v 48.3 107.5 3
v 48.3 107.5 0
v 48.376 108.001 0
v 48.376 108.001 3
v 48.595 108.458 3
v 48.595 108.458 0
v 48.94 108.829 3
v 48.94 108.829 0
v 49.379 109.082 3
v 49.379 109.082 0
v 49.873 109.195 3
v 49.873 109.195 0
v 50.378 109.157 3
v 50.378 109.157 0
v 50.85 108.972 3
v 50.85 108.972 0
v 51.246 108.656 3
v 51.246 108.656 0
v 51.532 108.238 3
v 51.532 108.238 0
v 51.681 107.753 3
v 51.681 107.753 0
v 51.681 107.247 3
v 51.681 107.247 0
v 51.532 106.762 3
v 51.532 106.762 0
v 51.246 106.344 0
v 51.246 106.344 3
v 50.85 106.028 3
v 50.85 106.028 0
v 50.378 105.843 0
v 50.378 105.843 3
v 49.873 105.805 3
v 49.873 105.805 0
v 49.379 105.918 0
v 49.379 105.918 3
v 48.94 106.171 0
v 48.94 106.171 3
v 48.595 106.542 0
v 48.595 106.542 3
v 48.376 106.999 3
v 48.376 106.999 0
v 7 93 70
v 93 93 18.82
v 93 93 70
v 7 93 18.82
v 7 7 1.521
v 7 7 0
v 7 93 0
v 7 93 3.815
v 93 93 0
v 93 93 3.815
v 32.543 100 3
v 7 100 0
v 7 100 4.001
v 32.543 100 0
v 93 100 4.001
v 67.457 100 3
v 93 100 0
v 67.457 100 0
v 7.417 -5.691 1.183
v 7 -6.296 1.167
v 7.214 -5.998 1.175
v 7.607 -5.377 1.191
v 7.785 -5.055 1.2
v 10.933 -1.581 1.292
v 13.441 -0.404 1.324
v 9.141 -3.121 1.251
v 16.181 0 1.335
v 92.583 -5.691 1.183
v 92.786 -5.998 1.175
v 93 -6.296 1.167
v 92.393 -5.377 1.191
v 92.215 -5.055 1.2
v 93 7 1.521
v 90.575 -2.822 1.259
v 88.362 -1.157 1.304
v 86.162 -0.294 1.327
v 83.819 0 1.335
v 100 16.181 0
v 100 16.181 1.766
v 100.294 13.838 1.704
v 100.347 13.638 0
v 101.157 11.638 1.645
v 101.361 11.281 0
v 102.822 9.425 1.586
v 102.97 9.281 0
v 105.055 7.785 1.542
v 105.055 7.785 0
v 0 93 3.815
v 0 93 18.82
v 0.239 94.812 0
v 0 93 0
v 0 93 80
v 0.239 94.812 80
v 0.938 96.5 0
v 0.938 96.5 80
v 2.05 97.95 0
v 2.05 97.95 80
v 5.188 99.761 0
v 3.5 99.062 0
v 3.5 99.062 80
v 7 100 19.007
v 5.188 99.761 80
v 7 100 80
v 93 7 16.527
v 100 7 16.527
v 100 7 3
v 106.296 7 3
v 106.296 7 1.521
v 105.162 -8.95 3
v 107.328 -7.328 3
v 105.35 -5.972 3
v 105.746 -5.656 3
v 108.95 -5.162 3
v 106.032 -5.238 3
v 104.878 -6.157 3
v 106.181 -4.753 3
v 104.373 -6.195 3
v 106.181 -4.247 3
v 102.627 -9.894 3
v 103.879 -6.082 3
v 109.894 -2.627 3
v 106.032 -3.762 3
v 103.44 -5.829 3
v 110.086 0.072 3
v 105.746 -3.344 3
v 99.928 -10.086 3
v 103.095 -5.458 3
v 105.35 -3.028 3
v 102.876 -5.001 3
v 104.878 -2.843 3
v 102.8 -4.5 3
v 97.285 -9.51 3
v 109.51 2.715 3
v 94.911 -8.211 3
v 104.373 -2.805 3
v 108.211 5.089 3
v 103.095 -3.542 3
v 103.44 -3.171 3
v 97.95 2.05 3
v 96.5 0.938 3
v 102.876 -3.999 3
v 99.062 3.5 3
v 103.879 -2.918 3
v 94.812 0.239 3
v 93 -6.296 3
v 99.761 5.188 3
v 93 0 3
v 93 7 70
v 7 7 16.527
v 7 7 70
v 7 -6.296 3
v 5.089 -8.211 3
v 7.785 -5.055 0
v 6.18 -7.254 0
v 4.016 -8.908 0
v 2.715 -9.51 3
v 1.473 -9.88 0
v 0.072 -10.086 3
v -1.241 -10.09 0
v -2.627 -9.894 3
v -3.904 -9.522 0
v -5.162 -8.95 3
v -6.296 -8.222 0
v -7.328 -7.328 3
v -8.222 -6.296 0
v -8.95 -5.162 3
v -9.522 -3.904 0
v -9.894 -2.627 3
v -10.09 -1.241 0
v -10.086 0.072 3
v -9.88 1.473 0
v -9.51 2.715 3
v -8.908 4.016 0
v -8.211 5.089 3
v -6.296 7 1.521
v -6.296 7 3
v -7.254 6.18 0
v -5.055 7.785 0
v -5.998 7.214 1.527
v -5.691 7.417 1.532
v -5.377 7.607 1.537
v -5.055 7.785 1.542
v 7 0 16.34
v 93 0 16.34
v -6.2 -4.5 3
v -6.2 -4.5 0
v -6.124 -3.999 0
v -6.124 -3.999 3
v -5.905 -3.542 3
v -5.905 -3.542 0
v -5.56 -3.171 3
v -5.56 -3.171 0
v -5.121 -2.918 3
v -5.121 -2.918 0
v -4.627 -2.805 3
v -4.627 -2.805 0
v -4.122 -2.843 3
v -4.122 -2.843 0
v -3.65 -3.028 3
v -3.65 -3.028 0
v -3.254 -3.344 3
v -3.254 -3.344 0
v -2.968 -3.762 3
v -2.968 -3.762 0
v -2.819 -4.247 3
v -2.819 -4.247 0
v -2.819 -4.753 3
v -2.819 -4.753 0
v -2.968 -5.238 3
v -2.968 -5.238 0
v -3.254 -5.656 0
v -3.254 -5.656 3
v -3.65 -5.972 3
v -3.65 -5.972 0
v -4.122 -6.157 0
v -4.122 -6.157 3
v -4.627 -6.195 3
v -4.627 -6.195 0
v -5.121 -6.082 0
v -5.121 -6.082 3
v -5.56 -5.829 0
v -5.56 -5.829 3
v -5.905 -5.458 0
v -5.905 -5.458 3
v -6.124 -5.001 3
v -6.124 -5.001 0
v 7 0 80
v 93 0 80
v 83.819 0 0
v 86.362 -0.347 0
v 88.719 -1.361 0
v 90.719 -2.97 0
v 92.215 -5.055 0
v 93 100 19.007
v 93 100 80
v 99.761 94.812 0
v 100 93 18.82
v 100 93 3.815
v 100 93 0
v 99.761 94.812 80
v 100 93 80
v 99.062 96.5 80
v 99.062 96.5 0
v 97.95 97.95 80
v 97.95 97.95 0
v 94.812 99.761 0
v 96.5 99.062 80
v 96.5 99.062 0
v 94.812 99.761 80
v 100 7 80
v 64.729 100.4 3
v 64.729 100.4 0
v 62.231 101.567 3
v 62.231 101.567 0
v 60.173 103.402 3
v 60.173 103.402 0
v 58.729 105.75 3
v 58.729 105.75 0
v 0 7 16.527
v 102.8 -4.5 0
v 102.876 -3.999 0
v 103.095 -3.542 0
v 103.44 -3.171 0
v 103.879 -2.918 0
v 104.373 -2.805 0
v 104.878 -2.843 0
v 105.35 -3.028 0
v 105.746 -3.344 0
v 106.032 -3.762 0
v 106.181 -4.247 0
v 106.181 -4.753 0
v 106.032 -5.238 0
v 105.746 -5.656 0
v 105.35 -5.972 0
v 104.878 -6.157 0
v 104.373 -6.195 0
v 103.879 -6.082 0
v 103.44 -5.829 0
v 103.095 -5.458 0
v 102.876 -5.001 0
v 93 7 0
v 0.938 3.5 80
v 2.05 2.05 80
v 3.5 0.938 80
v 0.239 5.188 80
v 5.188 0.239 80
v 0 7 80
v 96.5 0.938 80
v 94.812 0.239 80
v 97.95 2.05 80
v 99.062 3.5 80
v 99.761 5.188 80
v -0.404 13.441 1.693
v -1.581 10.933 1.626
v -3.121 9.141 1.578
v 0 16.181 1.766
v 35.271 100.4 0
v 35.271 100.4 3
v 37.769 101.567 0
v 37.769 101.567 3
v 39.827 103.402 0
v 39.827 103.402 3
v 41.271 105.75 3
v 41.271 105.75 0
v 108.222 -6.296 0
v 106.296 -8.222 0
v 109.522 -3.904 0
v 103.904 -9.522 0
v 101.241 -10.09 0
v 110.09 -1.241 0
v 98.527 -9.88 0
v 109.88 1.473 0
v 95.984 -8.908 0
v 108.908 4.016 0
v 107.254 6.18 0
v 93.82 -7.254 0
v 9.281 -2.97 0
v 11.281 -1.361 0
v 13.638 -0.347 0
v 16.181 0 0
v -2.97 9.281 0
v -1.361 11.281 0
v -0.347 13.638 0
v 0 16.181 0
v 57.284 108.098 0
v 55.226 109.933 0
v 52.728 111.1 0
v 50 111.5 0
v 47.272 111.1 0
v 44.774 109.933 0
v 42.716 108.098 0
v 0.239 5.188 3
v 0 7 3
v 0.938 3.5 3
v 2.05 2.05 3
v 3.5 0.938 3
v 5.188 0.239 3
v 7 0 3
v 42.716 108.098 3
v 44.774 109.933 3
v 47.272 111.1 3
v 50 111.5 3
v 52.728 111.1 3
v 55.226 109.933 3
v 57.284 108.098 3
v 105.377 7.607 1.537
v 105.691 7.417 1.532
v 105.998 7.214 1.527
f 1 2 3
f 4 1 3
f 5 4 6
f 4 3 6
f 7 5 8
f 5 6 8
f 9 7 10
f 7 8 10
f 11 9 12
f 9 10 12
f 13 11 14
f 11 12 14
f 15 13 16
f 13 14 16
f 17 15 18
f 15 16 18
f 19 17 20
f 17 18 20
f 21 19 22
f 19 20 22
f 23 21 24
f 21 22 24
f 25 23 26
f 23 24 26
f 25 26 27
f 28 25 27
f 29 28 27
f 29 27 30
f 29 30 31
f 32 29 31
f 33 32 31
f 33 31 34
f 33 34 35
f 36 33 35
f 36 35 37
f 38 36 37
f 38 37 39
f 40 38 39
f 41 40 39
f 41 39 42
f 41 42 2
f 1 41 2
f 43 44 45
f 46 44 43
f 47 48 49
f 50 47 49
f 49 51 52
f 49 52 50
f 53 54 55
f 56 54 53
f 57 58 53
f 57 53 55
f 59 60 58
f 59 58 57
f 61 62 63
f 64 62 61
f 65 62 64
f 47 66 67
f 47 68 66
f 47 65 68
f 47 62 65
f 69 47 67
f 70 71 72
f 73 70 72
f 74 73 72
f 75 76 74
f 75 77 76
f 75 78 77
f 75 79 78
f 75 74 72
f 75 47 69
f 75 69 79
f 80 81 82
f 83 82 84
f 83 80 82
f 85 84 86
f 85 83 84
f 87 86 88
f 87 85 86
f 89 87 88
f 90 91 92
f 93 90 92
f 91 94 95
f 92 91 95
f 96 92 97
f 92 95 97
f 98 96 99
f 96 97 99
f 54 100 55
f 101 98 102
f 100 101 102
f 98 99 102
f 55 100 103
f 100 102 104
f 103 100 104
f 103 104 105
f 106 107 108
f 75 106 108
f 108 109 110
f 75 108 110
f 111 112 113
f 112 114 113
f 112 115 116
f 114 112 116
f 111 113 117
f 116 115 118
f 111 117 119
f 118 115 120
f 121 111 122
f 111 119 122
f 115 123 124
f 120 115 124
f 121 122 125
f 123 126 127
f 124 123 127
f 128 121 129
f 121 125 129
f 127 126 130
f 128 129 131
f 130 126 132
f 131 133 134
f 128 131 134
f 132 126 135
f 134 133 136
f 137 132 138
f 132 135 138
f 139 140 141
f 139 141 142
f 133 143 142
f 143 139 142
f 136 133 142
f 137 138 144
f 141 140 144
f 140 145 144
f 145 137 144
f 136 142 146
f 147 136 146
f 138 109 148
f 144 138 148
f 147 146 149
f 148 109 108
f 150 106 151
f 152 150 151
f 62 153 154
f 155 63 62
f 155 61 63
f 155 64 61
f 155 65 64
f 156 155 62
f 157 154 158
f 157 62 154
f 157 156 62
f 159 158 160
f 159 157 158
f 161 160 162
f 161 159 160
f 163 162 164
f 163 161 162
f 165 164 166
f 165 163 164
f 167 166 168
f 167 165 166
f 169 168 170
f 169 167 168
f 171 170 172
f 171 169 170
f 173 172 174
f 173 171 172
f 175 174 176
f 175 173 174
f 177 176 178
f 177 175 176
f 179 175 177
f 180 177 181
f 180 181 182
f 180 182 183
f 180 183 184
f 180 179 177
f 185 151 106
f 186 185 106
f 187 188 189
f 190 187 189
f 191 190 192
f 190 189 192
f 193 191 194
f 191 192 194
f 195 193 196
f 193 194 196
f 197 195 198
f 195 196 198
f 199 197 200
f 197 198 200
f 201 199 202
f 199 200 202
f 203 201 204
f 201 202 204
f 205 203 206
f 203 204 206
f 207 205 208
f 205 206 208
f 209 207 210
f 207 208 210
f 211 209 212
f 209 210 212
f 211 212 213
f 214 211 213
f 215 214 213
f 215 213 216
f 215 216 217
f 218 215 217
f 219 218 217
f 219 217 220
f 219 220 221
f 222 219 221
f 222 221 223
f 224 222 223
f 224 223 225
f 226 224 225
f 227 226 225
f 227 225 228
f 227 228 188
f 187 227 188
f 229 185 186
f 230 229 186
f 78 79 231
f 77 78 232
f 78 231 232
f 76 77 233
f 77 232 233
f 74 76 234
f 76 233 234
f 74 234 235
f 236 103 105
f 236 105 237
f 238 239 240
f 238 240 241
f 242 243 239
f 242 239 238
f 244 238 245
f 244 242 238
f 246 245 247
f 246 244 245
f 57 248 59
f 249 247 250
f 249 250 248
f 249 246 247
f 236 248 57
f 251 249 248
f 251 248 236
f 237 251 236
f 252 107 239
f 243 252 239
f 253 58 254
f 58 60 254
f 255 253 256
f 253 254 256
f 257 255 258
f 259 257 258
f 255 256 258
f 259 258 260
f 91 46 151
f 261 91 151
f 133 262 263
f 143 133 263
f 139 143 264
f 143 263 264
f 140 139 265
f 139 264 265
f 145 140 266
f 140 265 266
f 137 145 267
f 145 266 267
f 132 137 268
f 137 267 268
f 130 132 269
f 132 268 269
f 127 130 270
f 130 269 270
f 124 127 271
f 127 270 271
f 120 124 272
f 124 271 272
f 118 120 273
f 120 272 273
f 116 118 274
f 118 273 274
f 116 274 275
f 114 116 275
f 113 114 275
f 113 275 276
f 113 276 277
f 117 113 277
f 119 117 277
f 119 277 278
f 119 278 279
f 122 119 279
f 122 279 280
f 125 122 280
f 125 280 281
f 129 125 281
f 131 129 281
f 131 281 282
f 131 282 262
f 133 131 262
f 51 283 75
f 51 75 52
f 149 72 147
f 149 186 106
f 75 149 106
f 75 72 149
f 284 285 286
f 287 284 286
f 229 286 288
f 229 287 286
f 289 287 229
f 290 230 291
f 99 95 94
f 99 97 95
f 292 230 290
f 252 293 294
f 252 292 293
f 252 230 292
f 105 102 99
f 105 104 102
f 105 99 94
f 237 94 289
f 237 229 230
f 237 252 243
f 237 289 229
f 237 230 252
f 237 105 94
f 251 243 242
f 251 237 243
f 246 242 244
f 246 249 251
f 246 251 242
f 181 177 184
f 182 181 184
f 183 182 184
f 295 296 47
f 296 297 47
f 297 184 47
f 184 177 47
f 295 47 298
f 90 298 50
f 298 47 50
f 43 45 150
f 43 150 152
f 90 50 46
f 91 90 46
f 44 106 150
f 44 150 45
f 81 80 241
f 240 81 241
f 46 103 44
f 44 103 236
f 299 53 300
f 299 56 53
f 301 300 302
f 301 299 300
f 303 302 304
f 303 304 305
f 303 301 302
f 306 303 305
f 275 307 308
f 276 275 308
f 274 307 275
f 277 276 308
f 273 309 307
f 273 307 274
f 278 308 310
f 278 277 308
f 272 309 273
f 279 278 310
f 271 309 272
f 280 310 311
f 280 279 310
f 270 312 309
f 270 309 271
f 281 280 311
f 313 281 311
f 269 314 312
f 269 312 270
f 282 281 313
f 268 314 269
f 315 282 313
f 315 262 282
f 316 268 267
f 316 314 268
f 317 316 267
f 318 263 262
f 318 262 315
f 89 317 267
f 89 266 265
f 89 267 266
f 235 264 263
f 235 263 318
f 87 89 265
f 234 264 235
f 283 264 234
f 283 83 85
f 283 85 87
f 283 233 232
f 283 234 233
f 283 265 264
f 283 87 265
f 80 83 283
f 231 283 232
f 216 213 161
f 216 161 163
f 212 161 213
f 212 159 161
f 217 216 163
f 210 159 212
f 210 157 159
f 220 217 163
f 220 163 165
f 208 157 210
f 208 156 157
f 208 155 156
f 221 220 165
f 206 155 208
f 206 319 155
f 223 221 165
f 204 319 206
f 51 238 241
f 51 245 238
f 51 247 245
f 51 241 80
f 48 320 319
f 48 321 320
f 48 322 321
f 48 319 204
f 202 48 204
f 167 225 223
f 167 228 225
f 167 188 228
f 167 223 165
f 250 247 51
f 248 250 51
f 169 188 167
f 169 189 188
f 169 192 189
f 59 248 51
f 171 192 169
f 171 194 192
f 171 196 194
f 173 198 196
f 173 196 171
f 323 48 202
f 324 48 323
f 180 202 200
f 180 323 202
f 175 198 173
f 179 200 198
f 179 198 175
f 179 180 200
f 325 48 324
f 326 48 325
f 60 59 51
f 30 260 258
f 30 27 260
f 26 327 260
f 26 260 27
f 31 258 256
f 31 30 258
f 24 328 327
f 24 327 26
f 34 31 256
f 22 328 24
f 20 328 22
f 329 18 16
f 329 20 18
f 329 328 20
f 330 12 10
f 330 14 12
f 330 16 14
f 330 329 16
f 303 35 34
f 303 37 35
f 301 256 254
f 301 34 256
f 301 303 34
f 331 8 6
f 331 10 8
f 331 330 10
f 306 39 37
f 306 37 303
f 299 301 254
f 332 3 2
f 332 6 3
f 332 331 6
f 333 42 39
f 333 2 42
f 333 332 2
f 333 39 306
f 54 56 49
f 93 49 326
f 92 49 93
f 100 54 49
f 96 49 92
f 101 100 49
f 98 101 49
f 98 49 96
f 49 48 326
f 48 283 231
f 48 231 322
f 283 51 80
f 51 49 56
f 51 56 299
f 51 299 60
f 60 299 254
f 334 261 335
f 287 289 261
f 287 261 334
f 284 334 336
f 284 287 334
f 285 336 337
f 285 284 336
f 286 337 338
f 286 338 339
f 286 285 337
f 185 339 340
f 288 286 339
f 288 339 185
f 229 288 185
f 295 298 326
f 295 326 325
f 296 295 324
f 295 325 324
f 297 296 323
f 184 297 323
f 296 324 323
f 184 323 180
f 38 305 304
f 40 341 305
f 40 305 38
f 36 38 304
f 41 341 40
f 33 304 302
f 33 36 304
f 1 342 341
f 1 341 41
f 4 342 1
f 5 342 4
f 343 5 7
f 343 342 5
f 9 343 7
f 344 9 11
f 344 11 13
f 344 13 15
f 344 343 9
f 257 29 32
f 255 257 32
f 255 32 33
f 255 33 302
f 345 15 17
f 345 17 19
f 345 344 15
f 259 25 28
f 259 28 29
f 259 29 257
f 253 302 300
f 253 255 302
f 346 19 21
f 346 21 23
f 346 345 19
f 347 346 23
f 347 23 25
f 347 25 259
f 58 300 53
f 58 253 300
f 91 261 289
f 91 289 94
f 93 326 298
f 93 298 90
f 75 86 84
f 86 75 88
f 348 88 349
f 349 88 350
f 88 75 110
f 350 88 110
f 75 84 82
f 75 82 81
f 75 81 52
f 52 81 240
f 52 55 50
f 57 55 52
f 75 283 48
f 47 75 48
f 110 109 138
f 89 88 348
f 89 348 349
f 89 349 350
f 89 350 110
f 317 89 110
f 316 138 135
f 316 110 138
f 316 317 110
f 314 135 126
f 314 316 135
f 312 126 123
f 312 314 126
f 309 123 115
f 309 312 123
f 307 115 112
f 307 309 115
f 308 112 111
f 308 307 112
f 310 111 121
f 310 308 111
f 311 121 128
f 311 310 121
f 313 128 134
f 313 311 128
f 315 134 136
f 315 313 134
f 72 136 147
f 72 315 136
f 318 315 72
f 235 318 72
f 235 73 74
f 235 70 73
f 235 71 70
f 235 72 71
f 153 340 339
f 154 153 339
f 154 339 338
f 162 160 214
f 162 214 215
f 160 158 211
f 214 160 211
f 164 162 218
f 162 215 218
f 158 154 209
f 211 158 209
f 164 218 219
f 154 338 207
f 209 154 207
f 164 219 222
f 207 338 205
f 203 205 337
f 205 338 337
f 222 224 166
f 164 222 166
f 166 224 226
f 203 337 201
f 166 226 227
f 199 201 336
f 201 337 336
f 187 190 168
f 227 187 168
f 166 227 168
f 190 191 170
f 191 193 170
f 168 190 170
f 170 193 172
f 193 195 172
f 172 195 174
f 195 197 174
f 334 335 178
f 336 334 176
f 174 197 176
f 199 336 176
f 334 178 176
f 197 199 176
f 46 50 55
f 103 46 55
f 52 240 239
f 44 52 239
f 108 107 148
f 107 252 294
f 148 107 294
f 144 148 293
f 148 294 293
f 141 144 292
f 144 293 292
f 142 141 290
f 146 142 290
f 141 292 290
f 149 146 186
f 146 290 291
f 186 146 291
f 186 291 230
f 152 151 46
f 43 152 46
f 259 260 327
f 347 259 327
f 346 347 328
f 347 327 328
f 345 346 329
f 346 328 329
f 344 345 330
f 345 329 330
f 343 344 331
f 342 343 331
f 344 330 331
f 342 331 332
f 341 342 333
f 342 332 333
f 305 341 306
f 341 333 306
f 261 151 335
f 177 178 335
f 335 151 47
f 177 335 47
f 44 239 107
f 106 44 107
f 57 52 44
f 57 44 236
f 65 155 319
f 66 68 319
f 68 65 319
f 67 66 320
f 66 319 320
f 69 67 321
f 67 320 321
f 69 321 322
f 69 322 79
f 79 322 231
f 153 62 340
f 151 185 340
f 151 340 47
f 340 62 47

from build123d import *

# Parameters (mm, degrees)
ESQUISSE1_W                           = 100
ESQUISSE1_H                           = 100
BOSS_EXTRU_1_DEPTH                    = 80
ESQUISSE2_W                           = 86
ESQUISSE2_H                           = 86
ENL_V_MAT_EXTRU_1_DEPTH               = 70
ESQUISSE4_R                           = 9.5
ESQUISSE4_R_2                         = 1.5
BOSS_EXTRU_3_DEPTH                    = 3
CONG_1_R                              = 7
CONG_4_R                              = 9.5
D_GAGEMENT_M31_D                      = 3.4
D_GAGEMENT_M31_DEPTH                  = 3
ENL_V_MAT_EXTRU_2_REACH               = 184.154
ENL_V_MAT_EXTRU_2_OFFSET_FROM_SURFACE = 7
ESQUISSE8_W                           = 86
ESQUISSE8_H                           = 15
ENL_V_START                           = -13.296333
ENL_V_MAT_EXTRU_3_DEPTH               = 112.592666


with BuildPart() as part:
    # Esquisse1 → Boss.-Extru.1 (new body)
    with BuildSketch(Plane.XY):
        with Locations((50, 50)):
            Rectangle(ESQUISSE1_W, ESQUISSE1_H)
    extrude(amount=BOSS_EXTRU_1_DEPTH)

    # Esquisse2 → Enlèv. mat.-Extru.1 (cut)
    with BuildSketch(Plane(origin=(0, 0, 0), x_dir=(-1, 0, 0), z_dir=(0, 0, -1))):
        with Locations((-50, 50)):
            Rectangle(ESQUISSE2_W, ESQUISSE2_H)
    extrude(amount=-ENL_V_MAT_EXTRU_1_DEPTH, mode=Mode.SUBTRACT)

    # Esquisse4 → Boss.-Extru.3 (add)
    # profile 1 of 3: a face of its own
    with BuildSketch(Plane(origin=(0, 0, 0), x_dir=(-1, 0, 0), z_dir=(0, 0, -1))):
        with Locations((0.610912703, -0.610912703)):
            Circle(ESQUISSE4_R)
        with Locations((4.5, -4.5)):
            Circle(ESQUISSE4_R_2, mode=Mode.SUBTRACT)
    # profile 2 of 3: a face of its own
    with BuildSketch(Plane(origin=(0, 0, 0), x_dir=(-1, 0, 0), z_dir=(0, 0, -1))):
        with Locations((-100.610912703, -0.610912703)):
            Circle(ESQUISSE4_R)
        with Locations((-104.5, -4.5)):
            Circle(ESQUISSE4_R_2, mode=Mode.SUBTRACT)
    # profile 3 of 3: a face of its own
    with BuildSketch(Plane(origin=(0, 0, 0), x_dir=(-1, 0, 0), z_dir=(0, 0, -1))):
        with BuildLine():
            Line((-46.958618735, 93), (-53.041381265, 93))
            ThreePointArc((-53.041381265, 93), (-50, 111.5), (-46.958618735, 93))
        make_face()
        with Locations((-50, 107.5)):
            Circle(ESQUISSE4_R_2, mode=Mode.SUBTRACT)
    extrude(amount=-BOSS_EXTRU_3_DEPTH)

    # Congé1
    cong_1_edges = [part.edges().sort_by_distance(p)[0] for p in [
        (0, 100, 40),
        (100, 100, 40),
        (100, 0, 41.5),
        (0, 0, 41.5),
    ]]
    fillet(cong_1_edges, radius=CONG_1_R)

    # Congé4
    cong_4_edges = [part.edges().sort_by_distance(p)[0] for p in [
        (91.130575913, 0, 1.5),
        (100, 8.869424087, 1.5),
        (0, 8.869424087, 1.5),
        (8.869424087, 0, 1.5),
        (40.712912189, 100, 1.5),
        (59.287087811, 100, 1.5),
    ]]
    fillet(cong_4_edges, radius=CONG_4_R)

    # Dégagement M31
    with Locations(Plane.XY.offset(3)):
        with Locations((104.5, -4.5), (-4.5, -4.5), (50, 107.5)):
            Hole(D_GAGEMENT_M31_D / 2, depth=D_GAGEMENT_M31_DEPTH)

    # Enlèv. mat.-Extru.2: up to this face of the body (flat: up to its plane, moved by the offset)
    enl_v_mat_extru_2_end = Plane(part.part.faces().sort_by_distance((50, 0, 40.310761501))[0]).offset(ENL_V_MAT_EXTRU_2_OFFSET_FROM_SURFACE)
    # Esquisse8 → Enlèv. mat.-Extru.2 (cut, up to the picked face)
    with BuildSketch(Plane(origin=(0, 102.060853814, 2.721755672), x_dir=(1, 0, 0), z_dir=(0, 0.9996445992724862, 0.026658491055395153)), mode=Mode.PRIVATE) as enl_v_mat_extru_2_sk1:
        with Locations((50, -8.834150894)):
            Rectangle(ESQUISSE8_W, ESQUISSE8_H)
    enl_v_mat_extru_2_tool1 = split(extrude(enl_v_mat_extru_2_sk1.sketch, amount=-ENL_V_MAT_EXTRU_2_REACH, mode=Mode.PRIVATE), bisect_by=enl_v_mat_extru_2_end, keep=Keep.BOTH, mode=Mode.PRIVATE)
    add(enl_v_mat_extru_2_tool1.solids().sort_by(Axis((50, 101.825349, 11.552767), (0, -0.9996445992724862, -0.026658491055395153)))[0], mode=Mode.SUBTRACT)

    # Esquisse9 → Enlèv. mat.-Extru.3 (cut)
    with BuildSketch(Plane.ZY.offset(-93).offset(ENL_V_START)):
        Polygon((18.820079232, 93), (16.52663391, 7), (1.521301003, 7), (3.814746326, 93), align=None)
    extrude(amount=ENL_V_MAT_EXTRU_3_DEPTH, mode=Mode.SUBTRACT)


solid = part.part
